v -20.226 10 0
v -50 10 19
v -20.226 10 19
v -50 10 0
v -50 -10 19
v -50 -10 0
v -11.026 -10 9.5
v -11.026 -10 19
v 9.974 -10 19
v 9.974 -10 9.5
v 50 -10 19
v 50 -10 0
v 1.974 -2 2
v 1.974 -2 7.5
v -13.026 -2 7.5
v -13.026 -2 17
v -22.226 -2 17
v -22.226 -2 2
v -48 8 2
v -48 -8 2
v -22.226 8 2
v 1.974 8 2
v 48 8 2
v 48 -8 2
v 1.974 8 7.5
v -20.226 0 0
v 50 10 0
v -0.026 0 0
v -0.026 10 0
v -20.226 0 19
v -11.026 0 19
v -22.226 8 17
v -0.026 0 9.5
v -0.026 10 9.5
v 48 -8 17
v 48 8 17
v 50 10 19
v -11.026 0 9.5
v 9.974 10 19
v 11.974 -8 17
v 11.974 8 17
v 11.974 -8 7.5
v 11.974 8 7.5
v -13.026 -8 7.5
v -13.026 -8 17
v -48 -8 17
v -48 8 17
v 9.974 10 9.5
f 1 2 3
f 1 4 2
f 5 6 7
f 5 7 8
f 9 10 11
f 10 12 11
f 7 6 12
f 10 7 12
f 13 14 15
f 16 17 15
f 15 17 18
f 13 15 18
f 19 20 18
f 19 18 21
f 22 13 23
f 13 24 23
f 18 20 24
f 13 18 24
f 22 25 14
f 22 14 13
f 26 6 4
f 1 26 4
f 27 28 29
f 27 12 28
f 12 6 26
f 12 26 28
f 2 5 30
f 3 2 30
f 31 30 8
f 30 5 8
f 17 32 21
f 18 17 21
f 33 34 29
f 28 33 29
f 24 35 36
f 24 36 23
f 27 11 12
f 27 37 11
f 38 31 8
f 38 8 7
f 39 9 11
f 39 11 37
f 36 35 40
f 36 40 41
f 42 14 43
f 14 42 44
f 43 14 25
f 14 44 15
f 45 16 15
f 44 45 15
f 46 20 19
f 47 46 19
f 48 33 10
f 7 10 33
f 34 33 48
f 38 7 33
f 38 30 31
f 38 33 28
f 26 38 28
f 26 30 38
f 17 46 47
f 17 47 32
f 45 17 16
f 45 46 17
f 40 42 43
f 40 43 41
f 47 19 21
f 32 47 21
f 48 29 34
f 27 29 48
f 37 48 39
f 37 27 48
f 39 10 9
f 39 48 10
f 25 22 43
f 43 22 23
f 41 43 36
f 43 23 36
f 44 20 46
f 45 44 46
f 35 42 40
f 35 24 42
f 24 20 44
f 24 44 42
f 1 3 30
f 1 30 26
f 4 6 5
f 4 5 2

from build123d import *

# Parameters (mm, degrees)
SKETCH_1_W           = 100
SKETCH_1_H           = 20
EXTRUDE_1_DEPTH      = 19
SKETCH_2_W           = 30
SKETCH_2_H           = 9
CUT_EXTRUDE_8_DEPTH  = 36.5
SKETCH_7_W           = 11
SKETCH_7_H           = 19
CUT_EXTRUDE_9_DEPTH  = 10
SKETCH_8_W           = 20
SKETCH_8_H           = 10
CUT_EXTRUDE_10_DEPTH = 10
SKETCH_9_W           = 11
SKETCH_9_H           = 19
EXTRUDE_3_DEPTH      = 10
SKETCH_10_W          = 10
SKETCH_10_H          = 10
EXTRUDE_4_DEPTH      = 10
SKETCH_11_W          = 10
SKETCH_11_H          = 10
CUT_EXTRUDE_11_DEPTH = 10
SKETCH_16_W          = 9
SKETCH_16_H          = 20
EXTRUDE_8_DEPTH      = 10
SKETCH_17_W          = 10
SKETCH_17_H          = 10
EXTRUDE_9_DEPTH      = 20
SKETCH_12_W          = 10
SKETCH_12_H          = 9
CUT_EXTRUDE_12_DEPTH = 21
SKETCH_19_W          = 10.2
SKETCH_19_H          = 19
CUT_EXTRUDE_16_DEPTH = 10
SKETCH_20_W          = 9
SKETCH_20_H          = 20
EXTRUDE_10_DEPTH     = 10
SKETCH_21_W          = 11
SKETCH_21_H          = 10.5
CUT_EXTRUDE_17_DEPTH = 10
SKETCH_22_W          = 0.5
SKETCH_22_H          = 20
CUT_EXTRUDE_18_DEPTH = 10
SHELL_1_T            = -2
SKETCH_23_W          = 15
SKETCH_23_H          = 16
EXTRUDE_11_DEPTH     = 2


with BuildPart() as part:
    # 草圖1 → 填料-伸長1 (new body)
    with BuildSketch(Plane.XY):
        Rectangle(SKETCH_1_W, SKETCH_1_H)
    extrude(amount=EXTRUDE_1_DEPTH)

    # 草圖2 → 除料-伸長8 (cut)
    with BuildSketch(Plane(origin=(0, 10, 0), x_dir=(1, 0, 0), z_dir=(0, 1, 0))):
        with Locations((4.974315736, -14.5)):
            Rectangle(SKETCH_2_W, SKETCH_2_H)
    extrude(amount=-CUT_EXTRUDE_8_DEPTH, mode=Mode.SUBTRACT)

    # 草圖7 → 除料-伸長9 (cut)
    with BuildSketch(Plane(origin=(0, 10, 0), x_dir=(1, 0, 0), z_dir=(0, 1, 0))):
        with Locations((-15.525684264, -9.5)):
            Rectangle(SKETCH_7_W, SKETCH_7_H)
    extrude(amount=-CUT_EXTRUDE_9_DEPTH, mode=Mode.SUBTRACT)

    # 草圖8 → 除料-伸長10 (cut)
    with BuildSketch(Plane(origin=(0, 10, 0), x_dir=(1, 0, 0), z_dir=(0, 1, 0))):
        with Locations((-0.025684264, -5)):
            Rectangle(SKETCH_8_W, SKETCH_8_H)
    extrude(amount=-CUT_EXTRUDE_10_DEPTH, mode=Mode.SUBTRACT)

    # 草圖9 → 填料-伸長3 (add)
    with BuildSketch(Plane(origin=(0, 0, 0), x_dir=(1, 0, 0), z_dir=(0, 1, 0))):
        with Locations((-15.525684264, -9.5)):
            Rectangle(SKETCH_9_W, SKETCH_9_H)
    extrude(amount=EXTRUDE_3_DEPTH)

    # 草圖10 → 填料-伸長4 (add)
    with BuildSketch(Plane(origin=(-10.025684264, 0, 0), x_dir=(0, 0, -1), z_dir=(1, 0, 0))):
        with Locations((-15, -5)):
            Rectangle(SKETCH_10_W, SKETCH_10_H)
    extrude(amount=EXTRUDE_4_DEPTH)

    # 草圖11 → 除料-伸長11 (cut)
    with BuildSketch(Plane(origin=(0, 10, 0), x_dir=(1, 0, 0), z_dir=(0, 1, 0))):
        with Locations((14.974315736, -5)):
            Rectangle(SKETCH_11_W, SKETCH_11_H)
    extrude(amount=-CUT_EXTRUDE_11_DEPTH, mode=Mode.SUBTRACT)

    # 草圖16 → 填料-伸長8 (add)
    with BuildSketch(Plane.ZY.offset(-19.974315736)):
        with Locations((14.5, 0)):
            Rectangle(SKETCH_16_W, SKETCH_16_H)
    extrude(amount=EXTRUDE_8_DEPTH)

    # 草圖17 → 填料-伸長9 (add)
    with BuildSketch(Plane.ZY.offset(-19.974315736)):
        with Locations((5, 5)):
            Rectangle(SKETCH_17_W, SKETCH_17_H)
    extrude(amount=EXTRUDE_9_DEPTH)

    # 草圖12 → 除料-伸長12 (cut)
    with BuildSketch(Plane(origin=(0, 10, 0), x_dir=(1, 0, 0), z_dir=(0, 1, 0))):
        with Locations((24.974315736, -14.5)):
            Rectangle(SKETCH_12_W, SKETCH_12_H)
    extrude(amount=-CUT_EXTRUDE_12_DEPTH, mode=Mode.SUBTRACT)

    # 草圖19 → 除料-伸長16 (cut)
    with BuildSketch(Plane(origin=(0, 10, 0), x_dir=(1, 0, 0), z_dir=(0, 1, 0))):
        with Locations((-15.125684264, -9.5)):
            Rectangle(SKETCH_19_W, SKETCH_19_H)
    extrude(amount=-CUT_EXTRUDE_16_DEPTH, mode=Mode.SUBTRACT)

    # 草圖20 → 填料-伸長10 (add)
    with BuildSketch(Plane.ZY.offset(-29.974315736)):
        with Locations((14.5, 0)):
            Rectangle(SKETCH_20_W, SKETCH_20_H)
    extrude(amount=EXTRUDE_10_DEPTH)

    # 草圖21 → 除料-伸長17 (cut)
    with BuildSketch(Plane(origin=(0, 0, 0), x_dir=(1, 0, 0), z_dir=(0, 1, 0))):
        with Locations((-5.525684264, -14.75)):
            Rectangle(SKETCH_21_W, SKETCH_21_H)
    extrude(amount=-CUT_EXTRUDE_17_DEPTH, mode=Mode.SUBTRACT)

    # 草圖22 → 除料-伸長18 (cut)
    with BuildSketch(Plane.ZY.offset(0.025684264)):
        with Locations((9.75, 0)):
            Rectangle(SKETCH_22_W, SKETCH_22_H)
    extrude(amount=-CUT_EXTRUDE_18_DEPTH, mode=Mode.SUBTRACT)

    # 薄殼1
    shell_1_openings = [part.faces().sort_by_distance(p)[0] for p in [
        (50, 0, 9.5),
    ]]
    offset(amount=SHELL_1_T, openings=shell_1_openings, kind=Kind.INTERSECTION)

    # 草圖23 → 填料-伸長11 (add)
    with BuildSketch(Plane(origin=(50, 0, 0), x_dir=(0, 0, -1), z_dir=(1, 0, 0))):
        with Locations((-9.5, 0)):
            Rectangle(SKETCH_23_W, SKETCH_23_H)
    extrude(amount=-EXTRUDE_11_DEPTH)


solid = part.part
